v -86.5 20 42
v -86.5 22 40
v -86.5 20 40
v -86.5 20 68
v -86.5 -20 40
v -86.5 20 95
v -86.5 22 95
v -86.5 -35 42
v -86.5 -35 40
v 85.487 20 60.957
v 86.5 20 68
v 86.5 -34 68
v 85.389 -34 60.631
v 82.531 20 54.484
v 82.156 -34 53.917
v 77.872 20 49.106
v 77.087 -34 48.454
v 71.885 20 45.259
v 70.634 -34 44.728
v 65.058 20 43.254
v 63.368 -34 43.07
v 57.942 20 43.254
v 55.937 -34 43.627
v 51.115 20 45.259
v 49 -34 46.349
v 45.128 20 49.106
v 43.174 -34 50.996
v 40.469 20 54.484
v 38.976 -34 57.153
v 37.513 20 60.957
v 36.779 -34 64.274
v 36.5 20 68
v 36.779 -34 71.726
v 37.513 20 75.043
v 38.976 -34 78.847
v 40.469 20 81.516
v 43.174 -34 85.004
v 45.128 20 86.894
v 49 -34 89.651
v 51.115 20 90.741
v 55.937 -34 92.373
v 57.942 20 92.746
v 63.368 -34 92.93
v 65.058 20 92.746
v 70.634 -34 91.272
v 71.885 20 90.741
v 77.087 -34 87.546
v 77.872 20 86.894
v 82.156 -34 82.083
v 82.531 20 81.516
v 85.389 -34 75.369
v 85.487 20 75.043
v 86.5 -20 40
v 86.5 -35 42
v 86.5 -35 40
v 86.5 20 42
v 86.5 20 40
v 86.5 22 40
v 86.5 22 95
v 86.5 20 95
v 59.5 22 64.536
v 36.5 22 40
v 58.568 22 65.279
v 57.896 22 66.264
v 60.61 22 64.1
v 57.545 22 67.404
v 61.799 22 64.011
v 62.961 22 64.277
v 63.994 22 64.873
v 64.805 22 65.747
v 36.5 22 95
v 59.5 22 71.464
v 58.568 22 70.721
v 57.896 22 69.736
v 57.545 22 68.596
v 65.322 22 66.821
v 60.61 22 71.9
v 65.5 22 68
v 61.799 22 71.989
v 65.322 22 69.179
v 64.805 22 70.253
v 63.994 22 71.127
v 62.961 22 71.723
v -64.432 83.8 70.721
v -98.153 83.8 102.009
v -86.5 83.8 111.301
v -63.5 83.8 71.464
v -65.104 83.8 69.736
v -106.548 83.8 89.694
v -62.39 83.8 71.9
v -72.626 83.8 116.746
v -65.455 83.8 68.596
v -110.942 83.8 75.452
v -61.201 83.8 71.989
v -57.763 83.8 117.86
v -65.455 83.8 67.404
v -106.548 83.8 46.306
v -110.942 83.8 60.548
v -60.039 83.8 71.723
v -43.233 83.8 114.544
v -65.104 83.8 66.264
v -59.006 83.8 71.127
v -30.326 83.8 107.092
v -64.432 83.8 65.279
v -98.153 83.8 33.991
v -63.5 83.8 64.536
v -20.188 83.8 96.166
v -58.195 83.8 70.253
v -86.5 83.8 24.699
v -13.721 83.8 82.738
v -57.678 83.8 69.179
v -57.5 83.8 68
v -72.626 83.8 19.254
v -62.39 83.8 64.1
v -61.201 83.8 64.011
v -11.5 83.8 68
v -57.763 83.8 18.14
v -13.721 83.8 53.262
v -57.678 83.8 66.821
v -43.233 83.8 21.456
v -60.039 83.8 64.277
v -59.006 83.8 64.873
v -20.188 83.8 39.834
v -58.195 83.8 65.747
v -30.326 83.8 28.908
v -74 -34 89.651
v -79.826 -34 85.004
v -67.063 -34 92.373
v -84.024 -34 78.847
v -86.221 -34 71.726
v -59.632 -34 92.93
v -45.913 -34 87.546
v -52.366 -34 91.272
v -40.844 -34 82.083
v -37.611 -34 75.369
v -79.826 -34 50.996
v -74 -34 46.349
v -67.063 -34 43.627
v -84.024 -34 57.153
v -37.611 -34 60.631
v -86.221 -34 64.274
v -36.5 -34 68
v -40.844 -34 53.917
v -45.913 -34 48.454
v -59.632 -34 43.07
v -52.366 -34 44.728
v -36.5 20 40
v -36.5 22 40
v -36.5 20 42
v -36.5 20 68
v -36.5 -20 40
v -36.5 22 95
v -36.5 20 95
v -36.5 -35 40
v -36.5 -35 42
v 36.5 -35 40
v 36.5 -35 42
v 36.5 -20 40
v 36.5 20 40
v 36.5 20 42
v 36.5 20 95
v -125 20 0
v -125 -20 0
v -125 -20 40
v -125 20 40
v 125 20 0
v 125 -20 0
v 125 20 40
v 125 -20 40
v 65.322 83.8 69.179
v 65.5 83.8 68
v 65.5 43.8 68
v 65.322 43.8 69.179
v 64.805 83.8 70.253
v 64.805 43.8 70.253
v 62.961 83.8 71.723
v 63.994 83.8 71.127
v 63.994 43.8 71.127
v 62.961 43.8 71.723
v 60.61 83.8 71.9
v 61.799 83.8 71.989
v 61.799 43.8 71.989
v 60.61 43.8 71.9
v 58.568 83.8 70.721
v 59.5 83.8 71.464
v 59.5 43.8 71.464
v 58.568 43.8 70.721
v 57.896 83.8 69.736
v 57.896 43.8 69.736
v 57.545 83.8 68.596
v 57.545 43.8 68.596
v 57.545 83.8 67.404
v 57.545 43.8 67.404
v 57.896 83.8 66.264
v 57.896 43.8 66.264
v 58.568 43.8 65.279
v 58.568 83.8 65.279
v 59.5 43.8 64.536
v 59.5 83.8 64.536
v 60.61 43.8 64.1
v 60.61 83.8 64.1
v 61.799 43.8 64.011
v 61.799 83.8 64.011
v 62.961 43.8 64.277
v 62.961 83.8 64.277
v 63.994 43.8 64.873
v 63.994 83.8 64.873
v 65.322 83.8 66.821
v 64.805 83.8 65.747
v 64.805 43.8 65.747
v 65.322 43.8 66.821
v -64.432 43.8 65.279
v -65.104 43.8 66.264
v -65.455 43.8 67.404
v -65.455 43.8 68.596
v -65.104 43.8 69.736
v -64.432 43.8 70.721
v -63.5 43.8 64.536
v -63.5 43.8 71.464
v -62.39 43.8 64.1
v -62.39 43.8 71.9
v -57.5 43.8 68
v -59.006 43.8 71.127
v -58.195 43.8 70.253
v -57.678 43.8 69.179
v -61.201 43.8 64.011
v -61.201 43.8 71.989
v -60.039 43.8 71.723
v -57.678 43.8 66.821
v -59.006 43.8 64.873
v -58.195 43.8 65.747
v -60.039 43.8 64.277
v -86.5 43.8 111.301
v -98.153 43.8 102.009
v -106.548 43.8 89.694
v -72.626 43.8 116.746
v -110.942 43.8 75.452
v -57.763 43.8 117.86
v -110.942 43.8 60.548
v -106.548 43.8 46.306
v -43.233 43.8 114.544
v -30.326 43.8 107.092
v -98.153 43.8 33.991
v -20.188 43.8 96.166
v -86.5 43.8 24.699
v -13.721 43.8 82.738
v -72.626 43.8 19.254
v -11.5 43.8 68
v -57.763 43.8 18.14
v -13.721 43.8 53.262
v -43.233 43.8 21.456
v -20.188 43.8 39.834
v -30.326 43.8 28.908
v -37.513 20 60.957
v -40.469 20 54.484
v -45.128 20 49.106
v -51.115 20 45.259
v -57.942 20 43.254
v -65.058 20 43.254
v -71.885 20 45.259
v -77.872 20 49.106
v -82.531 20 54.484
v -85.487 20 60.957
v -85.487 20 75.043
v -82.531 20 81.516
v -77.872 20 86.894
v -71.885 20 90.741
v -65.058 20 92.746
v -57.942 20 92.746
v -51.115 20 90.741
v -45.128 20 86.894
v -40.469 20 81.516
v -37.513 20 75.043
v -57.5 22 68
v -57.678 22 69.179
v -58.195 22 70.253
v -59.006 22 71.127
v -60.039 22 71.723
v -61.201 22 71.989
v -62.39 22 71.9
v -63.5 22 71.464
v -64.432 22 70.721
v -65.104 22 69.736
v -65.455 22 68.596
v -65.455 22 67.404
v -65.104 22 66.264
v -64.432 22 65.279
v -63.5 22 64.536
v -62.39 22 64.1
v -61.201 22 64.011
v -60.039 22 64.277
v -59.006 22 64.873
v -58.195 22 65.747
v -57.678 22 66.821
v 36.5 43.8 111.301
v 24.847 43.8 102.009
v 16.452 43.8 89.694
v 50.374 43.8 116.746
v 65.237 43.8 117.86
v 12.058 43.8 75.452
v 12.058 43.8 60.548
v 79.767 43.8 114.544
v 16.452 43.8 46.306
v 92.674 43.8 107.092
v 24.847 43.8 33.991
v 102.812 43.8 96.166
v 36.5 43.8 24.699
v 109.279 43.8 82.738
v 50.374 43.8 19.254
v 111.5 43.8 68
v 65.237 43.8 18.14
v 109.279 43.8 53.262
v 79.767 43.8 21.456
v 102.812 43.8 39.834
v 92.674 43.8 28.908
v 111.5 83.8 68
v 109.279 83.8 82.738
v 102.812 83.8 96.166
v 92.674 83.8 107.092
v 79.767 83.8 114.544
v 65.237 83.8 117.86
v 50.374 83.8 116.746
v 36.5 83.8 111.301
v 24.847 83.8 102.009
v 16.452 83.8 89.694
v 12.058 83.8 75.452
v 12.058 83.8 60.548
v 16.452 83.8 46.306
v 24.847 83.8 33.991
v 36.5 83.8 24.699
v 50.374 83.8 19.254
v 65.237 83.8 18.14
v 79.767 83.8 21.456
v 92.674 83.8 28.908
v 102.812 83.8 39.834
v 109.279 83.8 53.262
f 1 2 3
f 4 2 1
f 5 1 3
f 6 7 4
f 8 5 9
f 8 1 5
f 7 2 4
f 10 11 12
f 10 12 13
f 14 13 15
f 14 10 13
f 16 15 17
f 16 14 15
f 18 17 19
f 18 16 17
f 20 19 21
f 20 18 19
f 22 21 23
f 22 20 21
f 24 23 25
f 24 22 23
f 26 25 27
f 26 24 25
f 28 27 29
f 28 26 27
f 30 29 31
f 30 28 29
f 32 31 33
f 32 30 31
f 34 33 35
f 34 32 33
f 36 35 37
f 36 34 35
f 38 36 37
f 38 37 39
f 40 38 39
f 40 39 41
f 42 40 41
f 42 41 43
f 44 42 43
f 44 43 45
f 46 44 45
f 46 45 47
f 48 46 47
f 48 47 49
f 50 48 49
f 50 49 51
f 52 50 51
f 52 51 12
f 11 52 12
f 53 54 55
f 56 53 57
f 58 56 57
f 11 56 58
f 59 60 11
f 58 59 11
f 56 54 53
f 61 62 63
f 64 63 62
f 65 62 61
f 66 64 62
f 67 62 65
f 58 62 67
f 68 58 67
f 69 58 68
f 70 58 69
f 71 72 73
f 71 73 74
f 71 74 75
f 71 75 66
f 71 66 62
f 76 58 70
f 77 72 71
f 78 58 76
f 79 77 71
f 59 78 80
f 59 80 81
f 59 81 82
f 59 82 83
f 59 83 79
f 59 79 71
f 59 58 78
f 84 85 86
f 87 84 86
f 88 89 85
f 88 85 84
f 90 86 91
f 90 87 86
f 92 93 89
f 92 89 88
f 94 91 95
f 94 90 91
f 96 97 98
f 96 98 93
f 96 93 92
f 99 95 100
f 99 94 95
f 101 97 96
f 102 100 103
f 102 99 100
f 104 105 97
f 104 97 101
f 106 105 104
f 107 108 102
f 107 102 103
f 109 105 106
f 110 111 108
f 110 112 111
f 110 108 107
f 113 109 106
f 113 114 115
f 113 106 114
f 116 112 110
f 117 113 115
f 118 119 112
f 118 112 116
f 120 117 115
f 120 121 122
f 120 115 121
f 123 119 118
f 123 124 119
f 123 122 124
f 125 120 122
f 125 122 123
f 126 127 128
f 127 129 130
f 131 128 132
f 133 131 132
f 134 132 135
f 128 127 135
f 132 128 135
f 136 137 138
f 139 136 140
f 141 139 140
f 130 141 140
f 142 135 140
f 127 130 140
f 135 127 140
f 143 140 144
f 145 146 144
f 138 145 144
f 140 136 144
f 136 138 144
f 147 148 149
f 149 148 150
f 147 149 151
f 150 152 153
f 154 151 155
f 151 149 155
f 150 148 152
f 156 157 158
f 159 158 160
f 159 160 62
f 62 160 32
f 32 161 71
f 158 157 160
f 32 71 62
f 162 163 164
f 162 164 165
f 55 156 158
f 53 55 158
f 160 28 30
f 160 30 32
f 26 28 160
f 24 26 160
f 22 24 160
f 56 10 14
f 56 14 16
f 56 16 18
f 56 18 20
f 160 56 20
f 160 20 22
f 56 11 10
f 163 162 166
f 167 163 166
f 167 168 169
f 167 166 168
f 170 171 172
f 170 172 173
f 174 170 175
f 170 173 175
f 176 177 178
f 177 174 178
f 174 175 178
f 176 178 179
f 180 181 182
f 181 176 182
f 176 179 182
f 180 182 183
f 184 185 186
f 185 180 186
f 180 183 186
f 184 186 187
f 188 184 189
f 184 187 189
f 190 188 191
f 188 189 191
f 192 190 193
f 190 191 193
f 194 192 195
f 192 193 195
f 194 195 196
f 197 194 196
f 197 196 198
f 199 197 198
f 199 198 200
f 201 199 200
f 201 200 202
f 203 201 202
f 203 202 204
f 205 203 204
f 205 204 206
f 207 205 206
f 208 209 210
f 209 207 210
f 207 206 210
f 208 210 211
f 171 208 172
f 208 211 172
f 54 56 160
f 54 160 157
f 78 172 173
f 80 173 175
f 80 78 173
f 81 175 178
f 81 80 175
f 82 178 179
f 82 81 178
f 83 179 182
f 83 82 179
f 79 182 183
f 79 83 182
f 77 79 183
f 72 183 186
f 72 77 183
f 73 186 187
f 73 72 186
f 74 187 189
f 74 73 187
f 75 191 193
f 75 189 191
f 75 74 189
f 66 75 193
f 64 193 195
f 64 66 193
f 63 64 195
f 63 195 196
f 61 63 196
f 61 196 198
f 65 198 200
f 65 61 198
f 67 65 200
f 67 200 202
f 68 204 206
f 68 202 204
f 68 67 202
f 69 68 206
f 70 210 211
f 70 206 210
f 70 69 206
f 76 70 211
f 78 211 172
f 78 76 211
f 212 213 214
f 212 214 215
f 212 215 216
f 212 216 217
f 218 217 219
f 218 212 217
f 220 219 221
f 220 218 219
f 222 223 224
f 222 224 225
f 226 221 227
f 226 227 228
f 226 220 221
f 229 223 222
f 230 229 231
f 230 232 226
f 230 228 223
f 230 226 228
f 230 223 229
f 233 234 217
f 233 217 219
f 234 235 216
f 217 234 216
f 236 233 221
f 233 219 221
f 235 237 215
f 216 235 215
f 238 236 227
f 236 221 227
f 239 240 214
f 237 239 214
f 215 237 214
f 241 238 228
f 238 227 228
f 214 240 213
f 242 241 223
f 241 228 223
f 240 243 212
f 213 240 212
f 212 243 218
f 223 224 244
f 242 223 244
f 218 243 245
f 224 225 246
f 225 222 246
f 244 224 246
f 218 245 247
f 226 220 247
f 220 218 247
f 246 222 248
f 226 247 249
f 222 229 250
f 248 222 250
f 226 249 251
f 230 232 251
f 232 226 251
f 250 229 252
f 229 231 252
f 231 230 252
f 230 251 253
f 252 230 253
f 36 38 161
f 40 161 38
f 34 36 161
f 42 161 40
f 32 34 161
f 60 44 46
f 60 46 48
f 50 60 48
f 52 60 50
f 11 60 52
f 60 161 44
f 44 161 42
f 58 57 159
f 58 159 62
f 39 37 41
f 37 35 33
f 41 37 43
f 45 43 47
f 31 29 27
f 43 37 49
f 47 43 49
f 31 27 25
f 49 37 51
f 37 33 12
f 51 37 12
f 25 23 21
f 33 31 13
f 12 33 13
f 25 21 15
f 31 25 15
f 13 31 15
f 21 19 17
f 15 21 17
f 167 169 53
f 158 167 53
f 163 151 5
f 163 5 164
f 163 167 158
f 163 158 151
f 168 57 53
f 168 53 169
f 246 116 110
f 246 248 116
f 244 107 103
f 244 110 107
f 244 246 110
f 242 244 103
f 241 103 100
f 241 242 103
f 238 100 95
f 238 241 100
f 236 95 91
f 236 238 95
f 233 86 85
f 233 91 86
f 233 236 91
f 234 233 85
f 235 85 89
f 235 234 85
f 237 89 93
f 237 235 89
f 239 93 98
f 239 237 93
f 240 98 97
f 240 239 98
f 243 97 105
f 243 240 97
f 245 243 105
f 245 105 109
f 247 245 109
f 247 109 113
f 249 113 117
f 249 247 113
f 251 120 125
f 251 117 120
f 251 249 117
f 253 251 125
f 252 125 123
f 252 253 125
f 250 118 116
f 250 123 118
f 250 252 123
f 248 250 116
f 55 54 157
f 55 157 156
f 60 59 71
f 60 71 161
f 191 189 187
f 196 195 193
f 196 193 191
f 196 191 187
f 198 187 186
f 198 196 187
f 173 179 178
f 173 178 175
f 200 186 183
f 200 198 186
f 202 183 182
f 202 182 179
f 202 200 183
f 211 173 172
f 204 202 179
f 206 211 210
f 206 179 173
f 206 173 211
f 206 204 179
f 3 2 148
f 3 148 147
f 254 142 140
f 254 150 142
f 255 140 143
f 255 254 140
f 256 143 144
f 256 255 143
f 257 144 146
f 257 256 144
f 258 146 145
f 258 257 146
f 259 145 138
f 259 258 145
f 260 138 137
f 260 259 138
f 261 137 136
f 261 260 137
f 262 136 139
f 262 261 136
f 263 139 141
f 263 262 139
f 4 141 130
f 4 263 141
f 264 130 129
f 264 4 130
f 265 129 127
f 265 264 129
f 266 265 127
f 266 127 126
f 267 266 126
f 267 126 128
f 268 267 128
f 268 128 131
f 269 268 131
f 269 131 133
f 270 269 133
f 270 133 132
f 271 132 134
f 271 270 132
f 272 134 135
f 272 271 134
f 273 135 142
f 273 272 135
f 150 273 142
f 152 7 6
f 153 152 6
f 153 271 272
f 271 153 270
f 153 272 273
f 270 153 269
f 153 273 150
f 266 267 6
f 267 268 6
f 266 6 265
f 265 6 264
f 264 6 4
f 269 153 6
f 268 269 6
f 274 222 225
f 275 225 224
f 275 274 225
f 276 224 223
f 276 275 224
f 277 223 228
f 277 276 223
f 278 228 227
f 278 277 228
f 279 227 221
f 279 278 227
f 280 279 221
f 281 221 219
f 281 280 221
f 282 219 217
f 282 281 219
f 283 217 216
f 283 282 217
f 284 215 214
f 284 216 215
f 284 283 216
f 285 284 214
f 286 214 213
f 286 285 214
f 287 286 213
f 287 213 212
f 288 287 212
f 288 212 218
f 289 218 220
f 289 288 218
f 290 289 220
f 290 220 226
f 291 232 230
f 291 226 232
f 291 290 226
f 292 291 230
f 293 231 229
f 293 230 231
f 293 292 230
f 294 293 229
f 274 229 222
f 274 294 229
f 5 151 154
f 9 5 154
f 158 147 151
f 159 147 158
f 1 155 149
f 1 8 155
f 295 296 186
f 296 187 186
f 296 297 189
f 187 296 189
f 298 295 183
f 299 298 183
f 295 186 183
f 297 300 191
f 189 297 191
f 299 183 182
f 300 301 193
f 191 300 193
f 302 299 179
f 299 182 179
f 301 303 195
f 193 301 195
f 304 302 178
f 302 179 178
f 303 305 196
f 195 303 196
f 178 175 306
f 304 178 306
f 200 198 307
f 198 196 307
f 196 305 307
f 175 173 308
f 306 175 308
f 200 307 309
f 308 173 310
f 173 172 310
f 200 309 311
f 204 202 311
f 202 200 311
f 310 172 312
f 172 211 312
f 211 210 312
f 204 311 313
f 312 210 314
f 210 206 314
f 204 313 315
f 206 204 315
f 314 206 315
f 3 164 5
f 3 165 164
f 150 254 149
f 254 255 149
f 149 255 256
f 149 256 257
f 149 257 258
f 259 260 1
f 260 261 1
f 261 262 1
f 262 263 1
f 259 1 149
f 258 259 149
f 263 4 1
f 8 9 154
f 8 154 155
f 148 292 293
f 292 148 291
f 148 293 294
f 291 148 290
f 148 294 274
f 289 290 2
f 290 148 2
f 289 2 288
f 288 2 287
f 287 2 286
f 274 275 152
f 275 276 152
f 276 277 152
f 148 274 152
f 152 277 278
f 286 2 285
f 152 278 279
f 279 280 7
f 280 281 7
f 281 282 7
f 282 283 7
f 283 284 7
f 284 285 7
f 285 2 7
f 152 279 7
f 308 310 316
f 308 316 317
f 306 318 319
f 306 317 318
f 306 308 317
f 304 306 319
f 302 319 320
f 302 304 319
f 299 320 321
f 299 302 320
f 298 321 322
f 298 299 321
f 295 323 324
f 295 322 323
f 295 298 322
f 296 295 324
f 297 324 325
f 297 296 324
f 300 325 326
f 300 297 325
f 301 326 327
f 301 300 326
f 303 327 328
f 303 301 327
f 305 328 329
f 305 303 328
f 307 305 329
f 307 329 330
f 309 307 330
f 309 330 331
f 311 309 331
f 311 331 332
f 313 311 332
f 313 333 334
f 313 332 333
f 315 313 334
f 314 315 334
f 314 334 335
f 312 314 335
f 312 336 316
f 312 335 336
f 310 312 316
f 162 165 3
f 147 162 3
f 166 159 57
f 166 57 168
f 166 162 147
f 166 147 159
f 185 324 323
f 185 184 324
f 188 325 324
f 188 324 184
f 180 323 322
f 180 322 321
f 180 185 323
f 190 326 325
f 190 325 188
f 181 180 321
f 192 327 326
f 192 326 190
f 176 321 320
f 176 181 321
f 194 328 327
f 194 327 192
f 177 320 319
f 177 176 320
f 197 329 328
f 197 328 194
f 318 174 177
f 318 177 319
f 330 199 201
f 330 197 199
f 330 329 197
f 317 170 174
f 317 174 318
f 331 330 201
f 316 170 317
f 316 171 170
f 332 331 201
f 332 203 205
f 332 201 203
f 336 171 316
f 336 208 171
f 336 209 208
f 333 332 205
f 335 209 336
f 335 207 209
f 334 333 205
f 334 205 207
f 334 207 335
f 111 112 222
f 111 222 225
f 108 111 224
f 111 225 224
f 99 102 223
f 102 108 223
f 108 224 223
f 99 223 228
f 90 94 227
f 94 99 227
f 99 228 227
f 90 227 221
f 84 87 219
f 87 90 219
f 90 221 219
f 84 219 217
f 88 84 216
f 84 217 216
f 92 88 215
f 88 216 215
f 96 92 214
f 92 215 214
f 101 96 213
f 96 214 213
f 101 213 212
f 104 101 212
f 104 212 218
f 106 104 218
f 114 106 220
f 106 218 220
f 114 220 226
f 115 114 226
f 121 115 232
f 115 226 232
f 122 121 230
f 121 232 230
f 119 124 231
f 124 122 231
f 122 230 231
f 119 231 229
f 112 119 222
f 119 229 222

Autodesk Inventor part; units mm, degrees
ref_plane "YZ Plane" through (0, 0, 0) normal (1, 0, 0) x (0, 1, 0)
ref_plane "XZ Plane" through (0, 0, 0) normal (0, 1, 0) x (-1, 0, 0)
ref_plane "XY Plane" through (0, 0, 0) normal (0, 0, 1) x (1, 0, 0)
sketch "Sketch1" plane through (0, 0, 0) normal (0, 0, 1) x (1, 0, 0)
  line L0 (-125, 20) -> (125, 20)
  line L1 (125, 20) -> (125, -20)
  line L2 (125, -20) -> (-125, -20)
  line L3 (-125, -20) -> (-125, 20)
  line L4 (-125, 20) -> (125, -20) construction
  line L5 (125, 20) -> (-125, -20) construction
  point P0 (0, 0)
  dimension "d0" = 250
  dimension "d1" = 40
extrude "Extrusion1" add sketch "Sketch1" along normal blind 40
sketch "Sketch2" plane through (-125, 20, 0) normal (0, 1, 0) x (1, 0, 0)
  circle A0 centre (63.5, -68) radius 25
  circle A1 centre (186.5, -68) radius 25
  line L0 (250, -40) -> (0, -40) projected
  line L1 (0, 0) -> (0, -40) projected
  line L2 (250, 0) -> (250, -40) projected
  point P0 (125, 0)
  dimension "d4" = 50
  dimension "d5" = 50
  dimension "d6" = 28
  dimension "d7" = 28
  dimension "d8" = 63.5
  dimension "d9" = 63.5
  dimension "d10" = 123
extrude "Extrusion2" add sketch "Sketch2" against normal blind 54
sketch "Sketch3" plane through (-61.5, 20, 68) normal (0, 1, 0) x (1, 0, 0)
  circle A0 centre (0, 0) radius 4
  circle A1 centre (123, 0) radius 25 projected
  circle A2 centre (123, 0) radius 4
  point P0 (61.5, 68)
  dimension "d13" = 8
  dimension "d14" = 8
extrude "Extrusion3" add sketch "Sketch3" along normal blind 23.8 contours A0 | A2
ref_plane "Work Plane1" through (-86.5, 20, 68) normal (-1, 0, 0) x (0, -1, 0)
ref_plane "Work Plane2" through (86.5, 20, 68) normal (1, 0, 0) x (0, 1, 0)
sketch "Sketch5" plane through (-86.5, 20, 68) normal (-1, 0, 0) x (0, -1, 0)
  line L0 (0, -28) -> (55, -28)
  line L1 (55, -28) -> (55, -26)
  line L2 (55, -26) -> (0, -26)
  line L3 (0, -26) -> (0, -28)
  line L4 (0, -28) -> (-2, -28)
  line L5 (-2, -28) -> (-2, 27)
  line L6 (-2, 27) -> (0, 27)
  line L7 (0, 27) -> (0, -28)
  point P0 (20, -68)
  dimension "d17" = 55
  dimension "d18" = 2
  dimension "d19" = 2
  dimension "d20" = 55
extrude "Extrusion4" add sketch "Sketch5" against normal blind 50
sketch "Sketch6" plane through (86.5, 20, 68) normal (1, 0, 0) x (0, 1, 0)
  line L0 (0, 27) -> (0, 0) projected
  line L1 (0, 0) -> (0, -26) projected
  line L2 (0, -26) -> (-55, -26) projected
  line L3 (-55, -26) -> (-55, -28) projected
  line L4 (-55, -28) -> (-40, -28) projected
  line L5 (0, -28) -> (-40, -28) projected
  line L6 (0, -28) -> (2, -28) projected
  line L7 (2, -28) -> (2, 27) projected
  line L8 (2, 27) -> (0, 27) projected
  point P0 (-20, -68)
extrude "Extrusion5" add sketch "Sketch6" against normal blind 50
sketch "Sketch7" plane through (-61.5, 43.8, 68) normal (0, 1, 0) x (1, 0, 0)
  circle A0 centre (0, 0) radius 4 projected
  circle A1 centre (0, 0) radius 50
  circle A2 centre (123, 0) radius 4 projected
  circle A3 centre (123, 0) radius 50
  point P0 (61.5, 68)
  dimension "d25" = 100
  dimension "d26" = 100
extrude "Extrusion6" add sketch "Sketch7" along normal blind 40
equation "\"d7\" = d6"
equation "\"d9\" = d8"
properties part number "BSF_Accelerator_v01"
